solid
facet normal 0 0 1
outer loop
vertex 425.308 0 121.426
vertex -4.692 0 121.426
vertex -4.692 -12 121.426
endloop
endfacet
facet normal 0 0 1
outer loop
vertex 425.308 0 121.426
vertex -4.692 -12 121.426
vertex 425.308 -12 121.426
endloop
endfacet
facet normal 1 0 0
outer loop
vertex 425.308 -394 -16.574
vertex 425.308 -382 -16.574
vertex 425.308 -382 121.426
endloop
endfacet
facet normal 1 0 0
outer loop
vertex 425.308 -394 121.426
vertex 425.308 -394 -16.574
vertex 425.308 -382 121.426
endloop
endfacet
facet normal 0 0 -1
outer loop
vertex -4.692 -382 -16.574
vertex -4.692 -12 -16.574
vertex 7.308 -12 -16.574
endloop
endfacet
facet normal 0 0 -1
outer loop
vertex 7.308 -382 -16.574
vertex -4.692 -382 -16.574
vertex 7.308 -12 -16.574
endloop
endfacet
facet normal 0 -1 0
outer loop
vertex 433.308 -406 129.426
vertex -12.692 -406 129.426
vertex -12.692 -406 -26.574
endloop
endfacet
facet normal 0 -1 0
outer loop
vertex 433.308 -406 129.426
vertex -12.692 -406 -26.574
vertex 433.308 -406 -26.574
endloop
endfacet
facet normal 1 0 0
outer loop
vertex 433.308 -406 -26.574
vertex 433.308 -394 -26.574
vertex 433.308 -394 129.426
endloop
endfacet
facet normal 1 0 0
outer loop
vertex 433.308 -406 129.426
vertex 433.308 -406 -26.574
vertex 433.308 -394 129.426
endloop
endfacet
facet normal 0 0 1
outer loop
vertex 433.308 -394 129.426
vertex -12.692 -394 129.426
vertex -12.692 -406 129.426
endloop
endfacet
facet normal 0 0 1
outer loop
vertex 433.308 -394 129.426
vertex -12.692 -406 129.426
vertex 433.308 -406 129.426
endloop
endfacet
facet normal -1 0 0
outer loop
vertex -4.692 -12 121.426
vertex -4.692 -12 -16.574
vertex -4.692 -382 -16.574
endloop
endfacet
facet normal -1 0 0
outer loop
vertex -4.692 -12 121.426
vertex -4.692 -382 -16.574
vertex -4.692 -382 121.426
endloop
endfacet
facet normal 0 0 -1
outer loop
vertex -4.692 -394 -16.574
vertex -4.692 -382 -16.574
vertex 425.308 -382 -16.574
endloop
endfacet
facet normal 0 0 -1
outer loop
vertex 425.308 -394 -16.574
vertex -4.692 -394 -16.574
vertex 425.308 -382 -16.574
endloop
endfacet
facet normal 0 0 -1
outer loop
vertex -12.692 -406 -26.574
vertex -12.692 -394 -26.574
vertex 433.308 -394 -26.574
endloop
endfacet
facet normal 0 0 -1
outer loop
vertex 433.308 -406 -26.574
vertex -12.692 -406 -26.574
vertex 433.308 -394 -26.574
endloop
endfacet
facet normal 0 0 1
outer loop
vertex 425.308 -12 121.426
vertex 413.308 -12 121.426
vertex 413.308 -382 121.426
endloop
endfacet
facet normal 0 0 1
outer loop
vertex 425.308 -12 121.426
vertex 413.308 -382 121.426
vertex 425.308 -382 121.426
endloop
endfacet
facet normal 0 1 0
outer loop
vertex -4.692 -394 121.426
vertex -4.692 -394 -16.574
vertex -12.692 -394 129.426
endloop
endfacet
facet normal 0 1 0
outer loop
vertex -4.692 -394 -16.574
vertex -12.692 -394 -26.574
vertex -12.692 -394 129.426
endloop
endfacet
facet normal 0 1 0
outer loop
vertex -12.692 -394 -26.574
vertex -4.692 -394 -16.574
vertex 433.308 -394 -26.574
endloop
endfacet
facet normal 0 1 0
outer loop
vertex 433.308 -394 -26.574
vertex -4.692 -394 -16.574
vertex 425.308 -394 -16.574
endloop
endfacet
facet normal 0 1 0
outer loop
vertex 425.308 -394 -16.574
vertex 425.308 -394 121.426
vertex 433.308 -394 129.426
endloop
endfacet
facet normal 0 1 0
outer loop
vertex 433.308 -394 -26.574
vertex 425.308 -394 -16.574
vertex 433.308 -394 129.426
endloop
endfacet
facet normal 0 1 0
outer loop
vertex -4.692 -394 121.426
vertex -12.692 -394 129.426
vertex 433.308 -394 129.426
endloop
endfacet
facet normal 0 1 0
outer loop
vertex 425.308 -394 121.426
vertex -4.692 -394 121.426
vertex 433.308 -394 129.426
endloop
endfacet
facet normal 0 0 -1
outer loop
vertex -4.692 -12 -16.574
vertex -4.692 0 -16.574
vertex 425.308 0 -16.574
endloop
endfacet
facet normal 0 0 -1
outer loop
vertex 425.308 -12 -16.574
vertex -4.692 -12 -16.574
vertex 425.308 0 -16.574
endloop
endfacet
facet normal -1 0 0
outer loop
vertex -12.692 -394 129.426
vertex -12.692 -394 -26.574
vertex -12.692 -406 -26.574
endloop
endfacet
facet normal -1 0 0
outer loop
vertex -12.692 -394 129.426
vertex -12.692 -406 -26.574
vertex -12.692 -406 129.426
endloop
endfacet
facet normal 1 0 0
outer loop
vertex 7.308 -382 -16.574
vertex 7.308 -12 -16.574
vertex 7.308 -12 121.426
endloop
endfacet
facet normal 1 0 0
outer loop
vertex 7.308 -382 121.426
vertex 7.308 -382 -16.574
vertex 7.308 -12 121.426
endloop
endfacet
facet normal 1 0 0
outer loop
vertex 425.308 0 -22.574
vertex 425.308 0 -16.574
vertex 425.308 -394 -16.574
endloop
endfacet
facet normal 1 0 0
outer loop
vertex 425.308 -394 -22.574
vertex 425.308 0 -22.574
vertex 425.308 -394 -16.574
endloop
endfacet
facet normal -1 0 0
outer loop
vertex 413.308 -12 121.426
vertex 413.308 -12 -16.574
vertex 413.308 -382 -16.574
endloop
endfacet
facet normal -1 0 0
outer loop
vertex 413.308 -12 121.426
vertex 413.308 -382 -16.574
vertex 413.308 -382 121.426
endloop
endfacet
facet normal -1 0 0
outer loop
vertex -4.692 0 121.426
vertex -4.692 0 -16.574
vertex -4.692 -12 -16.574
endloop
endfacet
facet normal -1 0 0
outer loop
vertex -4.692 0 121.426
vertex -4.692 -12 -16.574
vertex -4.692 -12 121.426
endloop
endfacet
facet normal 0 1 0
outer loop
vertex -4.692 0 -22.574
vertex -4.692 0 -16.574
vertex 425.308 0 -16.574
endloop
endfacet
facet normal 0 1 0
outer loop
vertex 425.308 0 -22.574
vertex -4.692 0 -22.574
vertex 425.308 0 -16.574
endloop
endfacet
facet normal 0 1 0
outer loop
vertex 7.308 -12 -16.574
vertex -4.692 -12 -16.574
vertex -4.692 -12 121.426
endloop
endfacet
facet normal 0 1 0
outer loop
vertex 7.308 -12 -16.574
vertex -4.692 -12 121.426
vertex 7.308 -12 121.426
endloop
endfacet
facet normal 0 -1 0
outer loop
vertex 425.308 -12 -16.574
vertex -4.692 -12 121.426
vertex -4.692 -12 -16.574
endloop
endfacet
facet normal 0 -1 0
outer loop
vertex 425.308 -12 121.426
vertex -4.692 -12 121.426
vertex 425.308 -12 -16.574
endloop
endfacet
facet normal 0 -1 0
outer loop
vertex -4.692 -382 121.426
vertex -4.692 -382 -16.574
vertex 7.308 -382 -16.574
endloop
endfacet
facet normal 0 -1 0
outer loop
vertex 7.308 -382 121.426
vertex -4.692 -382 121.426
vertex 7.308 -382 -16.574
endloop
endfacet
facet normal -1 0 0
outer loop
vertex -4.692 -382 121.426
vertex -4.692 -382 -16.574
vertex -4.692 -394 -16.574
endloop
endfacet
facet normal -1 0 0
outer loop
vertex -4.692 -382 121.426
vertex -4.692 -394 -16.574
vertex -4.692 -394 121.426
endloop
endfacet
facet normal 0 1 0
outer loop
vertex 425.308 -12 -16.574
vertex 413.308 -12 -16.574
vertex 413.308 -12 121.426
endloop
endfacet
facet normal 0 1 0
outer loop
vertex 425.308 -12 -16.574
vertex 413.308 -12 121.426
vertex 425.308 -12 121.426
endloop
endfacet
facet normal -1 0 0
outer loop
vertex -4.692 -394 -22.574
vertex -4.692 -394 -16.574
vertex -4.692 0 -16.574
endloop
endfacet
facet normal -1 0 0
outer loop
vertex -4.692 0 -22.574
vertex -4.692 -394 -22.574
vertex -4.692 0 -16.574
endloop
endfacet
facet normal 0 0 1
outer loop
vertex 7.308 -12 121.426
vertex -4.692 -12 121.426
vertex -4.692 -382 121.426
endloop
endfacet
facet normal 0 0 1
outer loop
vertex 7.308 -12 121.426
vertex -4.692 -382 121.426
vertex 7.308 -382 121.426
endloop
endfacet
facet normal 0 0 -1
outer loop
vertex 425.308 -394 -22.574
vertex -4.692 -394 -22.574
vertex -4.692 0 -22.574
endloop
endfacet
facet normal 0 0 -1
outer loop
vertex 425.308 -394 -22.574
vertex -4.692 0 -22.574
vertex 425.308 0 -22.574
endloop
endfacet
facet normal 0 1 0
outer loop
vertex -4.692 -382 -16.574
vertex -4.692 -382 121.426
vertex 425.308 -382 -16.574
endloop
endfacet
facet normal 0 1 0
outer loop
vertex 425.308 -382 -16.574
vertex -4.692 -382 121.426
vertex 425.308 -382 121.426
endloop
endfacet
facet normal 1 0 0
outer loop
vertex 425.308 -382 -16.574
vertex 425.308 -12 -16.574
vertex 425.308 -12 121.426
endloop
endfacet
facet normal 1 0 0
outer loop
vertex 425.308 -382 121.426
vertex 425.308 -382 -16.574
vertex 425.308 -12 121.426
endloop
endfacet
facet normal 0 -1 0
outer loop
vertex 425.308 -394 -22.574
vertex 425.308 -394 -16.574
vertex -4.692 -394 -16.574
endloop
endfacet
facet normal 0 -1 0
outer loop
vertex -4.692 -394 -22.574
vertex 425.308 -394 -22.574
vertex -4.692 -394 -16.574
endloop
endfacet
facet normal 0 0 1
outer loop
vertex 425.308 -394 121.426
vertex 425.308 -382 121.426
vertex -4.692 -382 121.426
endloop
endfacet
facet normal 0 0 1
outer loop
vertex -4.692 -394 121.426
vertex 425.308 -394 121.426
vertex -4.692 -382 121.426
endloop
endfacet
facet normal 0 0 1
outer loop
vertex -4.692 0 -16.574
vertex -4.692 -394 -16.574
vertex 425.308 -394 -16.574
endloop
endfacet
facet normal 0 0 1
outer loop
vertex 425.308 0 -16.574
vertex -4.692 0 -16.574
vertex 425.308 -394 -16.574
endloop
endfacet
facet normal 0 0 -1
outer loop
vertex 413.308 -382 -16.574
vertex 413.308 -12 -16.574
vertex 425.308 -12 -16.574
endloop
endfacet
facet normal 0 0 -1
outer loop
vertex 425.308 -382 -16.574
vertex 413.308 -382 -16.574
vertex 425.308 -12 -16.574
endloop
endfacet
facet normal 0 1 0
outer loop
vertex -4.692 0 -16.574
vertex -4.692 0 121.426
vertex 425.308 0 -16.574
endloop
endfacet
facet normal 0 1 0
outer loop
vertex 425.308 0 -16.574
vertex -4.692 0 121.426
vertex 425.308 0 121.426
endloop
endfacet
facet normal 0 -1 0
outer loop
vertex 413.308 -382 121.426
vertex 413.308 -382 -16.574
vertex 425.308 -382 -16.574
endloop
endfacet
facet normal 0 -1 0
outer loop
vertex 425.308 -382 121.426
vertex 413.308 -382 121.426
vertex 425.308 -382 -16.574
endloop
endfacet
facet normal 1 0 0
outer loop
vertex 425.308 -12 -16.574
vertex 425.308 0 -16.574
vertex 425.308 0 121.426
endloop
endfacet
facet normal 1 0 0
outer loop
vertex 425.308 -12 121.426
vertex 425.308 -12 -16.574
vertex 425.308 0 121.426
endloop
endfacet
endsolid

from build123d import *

# Parameters (mm, degrees)
F0_W     = 430
F0_H     = 138
F1_DEPTH = 12
F2_W     = 12
F2_H     = 138
F3_DEPTH = 370
F4_W     = 418
F4_H     = 138
F4_W_2   = 12
F5_DEPTH = 12
F6_W     = 12
F6_H     = 370
F7_DEPTH = 6
F8_W     = 446
F8_H     = 156
F8_W_2   = 430
F8_H_2   = 138
F9_DEPTH = 12


with BuildPart() as f1:
    # F0 (on Front) → F1 (new body)
    with BuildSketch(Plane.XZ):
        with Locations((210.308117494, 52.4257982135)):
            Rectangle(F0_W, F0_H)
    extrude(amount=F1_DEPTH)


with BuildPart() as f3:
    # F2 (on face) → F3 (new body)
    with BuildSketch(Plane.XZ.offset(12)):
        with Locations((1.308117494, 52.4257982135)):
            Rectangle(F2_W, F2_H)
    extrude(amount=F3_DEPTH)


with BuildPart() as f3b:
    # F2 (on face) → F3, piece 2 (new body)
    with BuildSketch(Plane.XZ.offset(12)):
        with Locations((419.308117494, 52.4257982135)):
            Rectangle(F2_W, F2_H)
    extrude(amount=F3_DEPTH)


with BuildPart() as f5:
    # F4 (on face) → F5 (new body)
    with BuildSketch(Plane.XZ.offset(382)):
        with Locations((216.308117494, 52.4257982135)):
            Rectangle(F4_W, F4_H)
        with Locations((1.308117494, 52.4257982135)):
            Rectangle(F4_W_2, F4_H)
    extrude(amount=F5_DEPTH)

    # F8 (on face) → F9 (join)
    with BuildSketch(Plane.XZ.offset(394)):
        with Locations((210.308117494, 51.4257982135)):
            Rectangle(F8_W, F8_H)
        with Locations((210.308117494, 52.4257982135)):
            Rectangle(F8_W_2, F8_H_2, mode=Mode.SUBTRACT)
        with Locations((210.308117494, 52.4257982135)):
            Rectangle(F8_W_2, F8_H_2)
    extrude(amount=F9_DEPTH)


with BuildPart() as f7:
    # F6 (on face) → F7 (new body)
    with BuildSketch(Plane(origin=(0, 0, -16.5742017865), x_dir=(1, 0, 0), z_dir=(0, 0, -1))):
        Polygon((425.308117494, 394), (-4.691882506, 394), (-4.691882506, 382), (7.308117494, 382), (7.308117494, 12), (425.308117494, 12), align=None)
        with Locations((1.308117494, 197)):
            Rectangle(F6_W, F6_H)
        Polygon((425.308117494, 0), (425.308117494, 12), (7.308117494, 12), (-4.691882506, 12), (-4.691882506, 0), align=None)
    extrude(amount=F7_DEPTH)


solid = Compound([f1.part, f3.part, f3b.part, f5.part, f7.part])
